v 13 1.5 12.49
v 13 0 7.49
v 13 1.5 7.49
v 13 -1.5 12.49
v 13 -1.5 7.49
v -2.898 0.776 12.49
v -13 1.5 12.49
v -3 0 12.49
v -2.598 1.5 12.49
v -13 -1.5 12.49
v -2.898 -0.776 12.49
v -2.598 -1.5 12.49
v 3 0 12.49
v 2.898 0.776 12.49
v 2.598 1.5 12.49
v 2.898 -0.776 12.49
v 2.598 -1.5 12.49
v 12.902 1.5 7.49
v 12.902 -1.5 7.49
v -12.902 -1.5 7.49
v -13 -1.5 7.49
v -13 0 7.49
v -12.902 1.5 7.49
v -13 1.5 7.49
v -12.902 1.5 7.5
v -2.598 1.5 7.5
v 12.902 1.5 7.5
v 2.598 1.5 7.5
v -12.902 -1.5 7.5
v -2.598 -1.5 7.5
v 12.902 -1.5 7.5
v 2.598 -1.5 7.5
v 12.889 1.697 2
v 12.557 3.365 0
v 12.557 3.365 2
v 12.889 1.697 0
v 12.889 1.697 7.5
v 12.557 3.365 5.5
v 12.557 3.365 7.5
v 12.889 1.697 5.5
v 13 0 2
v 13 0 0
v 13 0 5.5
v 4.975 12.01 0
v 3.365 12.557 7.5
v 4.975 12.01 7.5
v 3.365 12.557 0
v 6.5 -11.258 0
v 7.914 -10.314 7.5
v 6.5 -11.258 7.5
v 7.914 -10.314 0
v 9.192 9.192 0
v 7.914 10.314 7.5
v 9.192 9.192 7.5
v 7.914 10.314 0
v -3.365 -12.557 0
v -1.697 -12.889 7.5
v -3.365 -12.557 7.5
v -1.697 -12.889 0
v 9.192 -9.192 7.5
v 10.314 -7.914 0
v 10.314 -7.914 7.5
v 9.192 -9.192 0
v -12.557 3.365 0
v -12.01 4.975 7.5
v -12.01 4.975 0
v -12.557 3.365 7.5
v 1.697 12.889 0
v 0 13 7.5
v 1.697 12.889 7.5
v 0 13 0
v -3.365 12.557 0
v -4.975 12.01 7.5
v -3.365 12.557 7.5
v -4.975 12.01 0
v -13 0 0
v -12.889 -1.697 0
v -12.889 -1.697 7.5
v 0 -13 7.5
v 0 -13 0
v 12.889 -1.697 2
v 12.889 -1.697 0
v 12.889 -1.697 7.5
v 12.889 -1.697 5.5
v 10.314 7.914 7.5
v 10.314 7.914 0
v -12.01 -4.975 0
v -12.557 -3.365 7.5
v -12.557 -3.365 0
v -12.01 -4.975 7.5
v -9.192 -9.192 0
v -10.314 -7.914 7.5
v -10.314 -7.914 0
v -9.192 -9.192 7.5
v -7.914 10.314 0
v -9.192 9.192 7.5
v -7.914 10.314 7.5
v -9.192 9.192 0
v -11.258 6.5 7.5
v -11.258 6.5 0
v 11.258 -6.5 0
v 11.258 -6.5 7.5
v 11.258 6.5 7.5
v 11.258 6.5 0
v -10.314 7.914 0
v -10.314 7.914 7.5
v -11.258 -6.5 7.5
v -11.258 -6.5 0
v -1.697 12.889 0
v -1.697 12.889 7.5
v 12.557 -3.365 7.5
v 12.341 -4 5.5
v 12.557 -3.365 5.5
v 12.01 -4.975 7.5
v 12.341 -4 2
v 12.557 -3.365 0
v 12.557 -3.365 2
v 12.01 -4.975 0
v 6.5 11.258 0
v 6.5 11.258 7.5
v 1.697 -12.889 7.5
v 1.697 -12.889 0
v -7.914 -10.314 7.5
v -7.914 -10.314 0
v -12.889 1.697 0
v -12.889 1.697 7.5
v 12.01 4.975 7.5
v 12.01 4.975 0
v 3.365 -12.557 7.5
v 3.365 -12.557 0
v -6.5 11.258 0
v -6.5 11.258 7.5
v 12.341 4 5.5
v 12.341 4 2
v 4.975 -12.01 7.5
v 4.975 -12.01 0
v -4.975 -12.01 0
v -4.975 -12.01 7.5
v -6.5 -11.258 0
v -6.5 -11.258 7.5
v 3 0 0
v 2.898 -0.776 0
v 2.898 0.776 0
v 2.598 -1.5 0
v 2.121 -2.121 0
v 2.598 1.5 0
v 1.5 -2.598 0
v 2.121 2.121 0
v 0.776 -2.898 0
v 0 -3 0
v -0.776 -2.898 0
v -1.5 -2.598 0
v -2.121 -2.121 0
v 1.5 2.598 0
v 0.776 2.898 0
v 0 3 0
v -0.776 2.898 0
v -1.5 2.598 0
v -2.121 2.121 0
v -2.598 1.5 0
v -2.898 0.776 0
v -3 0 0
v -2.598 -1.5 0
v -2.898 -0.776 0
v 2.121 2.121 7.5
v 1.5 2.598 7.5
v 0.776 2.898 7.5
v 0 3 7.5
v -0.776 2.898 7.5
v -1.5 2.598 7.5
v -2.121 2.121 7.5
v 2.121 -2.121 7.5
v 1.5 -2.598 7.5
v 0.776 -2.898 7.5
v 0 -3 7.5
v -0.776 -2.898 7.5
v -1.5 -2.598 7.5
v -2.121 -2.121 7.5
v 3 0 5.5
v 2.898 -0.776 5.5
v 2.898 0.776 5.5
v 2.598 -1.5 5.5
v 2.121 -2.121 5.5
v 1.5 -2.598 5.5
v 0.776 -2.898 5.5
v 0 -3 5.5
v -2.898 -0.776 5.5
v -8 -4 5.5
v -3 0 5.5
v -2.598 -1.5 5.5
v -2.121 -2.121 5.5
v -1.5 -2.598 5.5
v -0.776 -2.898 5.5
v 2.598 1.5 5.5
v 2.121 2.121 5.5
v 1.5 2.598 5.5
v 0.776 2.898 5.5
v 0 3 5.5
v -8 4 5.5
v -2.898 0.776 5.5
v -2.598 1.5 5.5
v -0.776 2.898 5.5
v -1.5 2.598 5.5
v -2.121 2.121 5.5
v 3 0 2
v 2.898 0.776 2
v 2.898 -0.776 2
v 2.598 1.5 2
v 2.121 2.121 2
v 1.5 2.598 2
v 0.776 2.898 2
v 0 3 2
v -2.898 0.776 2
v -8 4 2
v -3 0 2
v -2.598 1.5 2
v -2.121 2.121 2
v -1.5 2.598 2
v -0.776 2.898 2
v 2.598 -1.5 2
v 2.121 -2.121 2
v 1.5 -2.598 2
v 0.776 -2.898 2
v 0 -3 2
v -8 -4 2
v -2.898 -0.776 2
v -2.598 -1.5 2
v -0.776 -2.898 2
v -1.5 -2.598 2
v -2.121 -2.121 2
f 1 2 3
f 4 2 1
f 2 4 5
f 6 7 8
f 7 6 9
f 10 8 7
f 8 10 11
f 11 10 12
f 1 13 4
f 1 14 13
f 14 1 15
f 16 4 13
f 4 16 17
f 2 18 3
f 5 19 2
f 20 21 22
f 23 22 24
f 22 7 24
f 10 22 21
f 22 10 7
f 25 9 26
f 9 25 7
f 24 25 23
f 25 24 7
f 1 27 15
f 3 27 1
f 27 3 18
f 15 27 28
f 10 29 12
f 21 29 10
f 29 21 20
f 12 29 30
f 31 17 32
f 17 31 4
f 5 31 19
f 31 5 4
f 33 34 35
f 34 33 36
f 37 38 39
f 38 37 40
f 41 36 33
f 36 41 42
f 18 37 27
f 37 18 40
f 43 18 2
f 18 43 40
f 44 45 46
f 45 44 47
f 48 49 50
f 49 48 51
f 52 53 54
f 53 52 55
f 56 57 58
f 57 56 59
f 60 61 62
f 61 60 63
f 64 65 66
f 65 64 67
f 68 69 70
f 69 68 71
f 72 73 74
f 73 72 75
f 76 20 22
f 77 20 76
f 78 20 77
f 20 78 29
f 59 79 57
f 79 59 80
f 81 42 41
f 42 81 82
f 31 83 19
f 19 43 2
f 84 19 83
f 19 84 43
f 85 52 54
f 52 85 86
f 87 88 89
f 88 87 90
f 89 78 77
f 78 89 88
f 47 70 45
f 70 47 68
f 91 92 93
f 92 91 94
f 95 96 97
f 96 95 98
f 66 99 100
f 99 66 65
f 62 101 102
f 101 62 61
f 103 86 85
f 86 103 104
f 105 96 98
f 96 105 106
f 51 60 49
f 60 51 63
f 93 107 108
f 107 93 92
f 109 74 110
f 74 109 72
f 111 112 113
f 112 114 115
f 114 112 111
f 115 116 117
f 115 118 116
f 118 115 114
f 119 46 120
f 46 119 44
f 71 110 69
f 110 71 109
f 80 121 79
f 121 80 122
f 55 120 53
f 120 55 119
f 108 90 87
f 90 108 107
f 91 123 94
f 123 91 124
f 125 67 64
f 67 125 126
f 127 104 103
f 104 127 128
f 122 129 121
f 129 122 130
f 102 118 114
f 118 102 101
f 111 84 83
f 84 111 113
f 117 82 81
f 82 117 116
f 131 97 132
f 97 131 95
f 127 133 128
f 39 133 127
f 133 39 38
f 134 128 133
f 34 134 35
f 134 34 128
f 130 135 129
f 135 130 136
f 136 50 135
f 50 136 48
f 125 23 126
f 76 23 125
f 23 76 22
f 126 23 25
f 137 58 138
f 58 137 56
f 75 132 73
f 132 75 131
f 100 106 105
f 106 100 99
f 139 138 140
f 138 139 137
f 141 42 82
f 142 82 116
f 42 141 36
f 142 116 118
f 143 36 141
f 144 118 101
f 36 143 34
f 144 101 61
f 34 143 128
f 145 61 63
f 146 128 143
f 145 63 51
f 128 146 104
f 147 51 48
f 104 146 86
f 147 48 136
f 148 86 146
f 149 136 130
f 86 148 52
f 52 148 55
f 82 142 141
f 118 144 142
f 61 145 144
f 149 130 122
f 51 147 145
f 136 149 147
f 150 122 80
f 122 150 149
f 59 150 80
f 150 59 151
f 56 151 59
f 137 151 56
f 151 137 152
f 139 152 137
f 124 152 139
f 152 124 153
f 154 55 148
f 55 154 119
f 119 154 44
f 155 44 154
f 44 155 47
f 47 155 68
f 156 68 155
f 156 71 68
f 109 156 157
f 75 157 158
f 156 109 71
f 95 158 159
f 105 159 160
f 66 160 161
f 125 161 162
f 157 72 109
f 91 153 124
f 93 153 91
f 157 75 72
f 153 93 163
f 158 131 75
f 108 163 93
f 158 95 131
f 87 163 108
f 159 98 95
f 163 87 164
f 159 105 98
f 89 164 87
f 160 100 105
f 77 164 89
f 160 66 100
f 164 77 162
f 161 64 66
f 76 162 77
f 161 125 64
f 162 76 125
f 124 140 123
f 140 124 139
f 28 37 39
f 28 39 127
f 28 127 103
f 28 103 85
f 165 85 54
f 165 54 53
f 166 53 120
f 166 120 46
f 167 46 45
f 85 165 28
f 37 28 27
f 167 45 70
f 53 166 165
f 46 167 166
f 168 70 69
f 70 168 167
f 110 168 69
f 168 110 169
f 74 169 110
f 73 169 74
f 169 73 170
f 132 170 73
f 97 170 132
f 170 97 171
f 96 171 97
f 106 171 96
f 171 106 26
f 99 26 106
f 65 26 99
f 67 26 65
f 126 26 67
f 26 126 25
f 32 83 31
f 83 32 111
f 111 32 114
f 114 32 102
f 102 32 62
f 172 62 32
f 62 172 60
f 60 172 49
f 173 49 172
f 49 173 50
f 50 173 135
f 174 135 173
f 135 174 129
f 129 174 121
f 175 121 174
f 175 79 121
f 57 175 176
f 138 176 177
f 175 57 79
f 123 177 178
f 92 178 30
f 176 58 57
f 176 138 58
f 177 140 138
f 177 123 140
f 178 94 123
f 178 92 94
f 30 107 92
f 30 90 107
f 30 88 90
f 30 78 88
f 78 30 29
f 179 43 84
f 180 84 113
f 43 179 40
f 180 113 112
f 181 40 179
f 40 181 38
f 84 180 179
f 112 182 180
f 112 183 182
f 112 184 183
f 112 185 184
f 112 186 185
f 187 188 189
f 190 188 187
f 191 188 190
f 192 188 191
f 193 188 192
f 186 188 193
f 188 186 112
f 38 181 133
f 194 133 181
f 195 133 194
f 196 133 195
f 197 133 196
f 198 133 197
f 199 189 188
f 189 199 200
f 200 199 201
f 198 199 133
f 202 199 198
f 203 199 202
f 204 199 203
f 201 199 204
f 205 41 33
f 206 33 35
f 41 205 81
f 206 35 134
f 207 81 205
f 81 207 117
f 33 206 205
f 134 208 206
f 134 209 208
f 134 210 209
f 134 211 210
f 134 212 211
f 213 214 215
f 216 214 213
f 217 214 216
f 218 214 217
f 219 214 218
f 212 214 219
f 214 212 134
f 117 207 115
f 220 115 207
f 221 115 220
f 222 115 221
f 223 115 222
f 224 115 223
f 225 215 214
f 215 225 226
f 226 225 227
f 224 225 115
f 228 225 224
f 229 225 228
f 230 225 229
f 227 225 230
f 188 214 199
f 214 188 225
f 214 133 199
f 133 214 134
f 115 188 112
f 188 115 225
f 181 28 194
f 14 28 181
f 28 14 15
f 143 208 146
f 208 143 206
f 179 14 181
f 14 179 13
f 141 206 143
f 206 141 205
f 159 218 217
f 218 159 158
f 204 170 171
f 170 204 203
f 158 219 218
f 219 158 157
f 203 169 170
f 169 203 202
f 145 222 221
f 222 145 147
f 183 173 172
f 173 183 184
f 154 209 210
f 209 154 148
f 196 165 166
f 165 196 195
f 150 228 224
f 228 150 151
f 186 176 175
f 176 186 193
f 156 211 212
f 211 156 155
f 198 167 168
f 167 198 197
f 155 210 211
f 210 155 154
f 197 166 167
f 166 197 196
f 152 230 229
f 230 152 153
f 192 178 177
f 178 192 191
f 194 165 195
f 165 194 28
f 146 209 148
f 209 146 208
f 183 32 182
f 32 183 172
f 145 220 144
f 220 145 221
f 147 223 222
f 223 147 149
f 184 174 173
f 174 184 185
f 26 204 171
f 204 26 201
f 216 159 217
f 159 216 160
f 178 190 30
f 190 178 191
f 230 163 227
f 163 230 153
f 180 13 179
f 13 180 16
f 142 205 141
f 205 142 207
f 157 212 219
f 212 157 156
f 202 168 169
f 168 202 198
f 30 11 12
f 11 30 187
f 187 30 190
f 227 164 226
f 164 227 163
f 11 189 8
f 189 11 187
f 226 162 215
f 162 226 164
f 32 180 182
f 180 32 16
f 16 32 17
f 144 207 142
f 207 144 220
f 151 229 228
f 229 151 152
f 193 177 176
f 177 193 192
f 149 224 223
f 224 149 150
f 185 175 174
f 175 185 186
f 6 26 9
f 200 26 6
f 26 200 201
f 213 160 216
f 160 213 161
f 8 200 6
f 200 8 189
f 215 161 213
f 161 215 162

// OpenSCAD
// file: nut-header.scad
// Bolt holder for Topeak adjustable bottle cage

// Copyright (C) 2016 Embecosm Limited (www.embecosm.com)

// Contributor: Jeremy Bennett <jeremy.bennett@embecosm.com>

// This file is licensed under the Creative Commons Attribution-ShareAlike 3.0
// Unported License. To view a copy of this license, visit
// http://creativecommons.org/licenses/by-sa/3.0/ or send a letter to Creative
// Commons, PO Box 1866, Mountain View, CA 94042, USA.


// This is the common header

SPILL = 0.5;			// Allowance for flow of plastic
DELTA = 0.01;

BLOCK_D_X = 13 - SPILL *2;
BLOCK_D_Y = 11 - SPILL * 2;
HOLE_H = 3;
NUT_H = 2;
NUT_D = 8 + SPILL * 2;
HOLE_D = 5 + SPILL * 2;
WASHER_D = 27 - SPILL * 2;
WASHER_H = 3;
LUG_X = 6 - SPILL * 2;
LUG_Y = 3 - SPILL * 2;
LUG_H = 2;
LOCK_NUT_X = 15 + SPILL * 2;
LOCK_NUT_Y = 7 + SPILL * 2;
LOCK_NUT_H = 3.5;
LOCK_H = LOCK_NUT_H + 4;
HANDLE_Y = 4 - SPILL * 2;
HANDLE_H = 5;
// main file
// Bolt holder for Topeak adjustable bottle cage

// Copyright (C) 2016 Embecosm Limited (www.embecosm.com)

// Contributor: Jeremy Bennett <jeremy.bennett@embecosm.com>

// This file is licensed under the Creative Commons Attribution-ShareAlike 3.0
// Unported License. To view a copy of this license, visit
// http://creativecommons.org/licenses/by-sa/3.0/ or send a letter to Creative
// Commons, PO Box 1866, Mountain View, CA 94042, USA.


// This is the lock for the outer nut.

include <nut-header.scad>


module slot () {
    translate (v = [50, 0, 2 + LOCK_NUT_H / 2])
        cube (size = [100 + LOCK_NUT_X, LOCK_NUT_Y, LOCK_NUT_H],
              center = true);
}

module hole () {
    translate (v = [0, 0, -DELTA])
        cylinder (r = HOLE_D / 2, h = HANDLE_H + LOCK_H + DELTA * 2,
                  $fn = 24, center = false);
}

module nut_lock_block () {
    union () {
         translate (v = [ 0, 0,
                         HANDLE_H / 2 + LOCK_H - DELTA  ])
            cube (size = [WASHER_D, HANDLE_Y, HANDLE_H], center = true);
        cylinder (r = WASHER_D / 2, h = LOCK_H, $fn = 48,
                  center = false);
    }
}

module nut_lock () {
    difference () {
        nut_lock_block ();
        slot ();
        hole ();
    }
}

nut_lock ();
